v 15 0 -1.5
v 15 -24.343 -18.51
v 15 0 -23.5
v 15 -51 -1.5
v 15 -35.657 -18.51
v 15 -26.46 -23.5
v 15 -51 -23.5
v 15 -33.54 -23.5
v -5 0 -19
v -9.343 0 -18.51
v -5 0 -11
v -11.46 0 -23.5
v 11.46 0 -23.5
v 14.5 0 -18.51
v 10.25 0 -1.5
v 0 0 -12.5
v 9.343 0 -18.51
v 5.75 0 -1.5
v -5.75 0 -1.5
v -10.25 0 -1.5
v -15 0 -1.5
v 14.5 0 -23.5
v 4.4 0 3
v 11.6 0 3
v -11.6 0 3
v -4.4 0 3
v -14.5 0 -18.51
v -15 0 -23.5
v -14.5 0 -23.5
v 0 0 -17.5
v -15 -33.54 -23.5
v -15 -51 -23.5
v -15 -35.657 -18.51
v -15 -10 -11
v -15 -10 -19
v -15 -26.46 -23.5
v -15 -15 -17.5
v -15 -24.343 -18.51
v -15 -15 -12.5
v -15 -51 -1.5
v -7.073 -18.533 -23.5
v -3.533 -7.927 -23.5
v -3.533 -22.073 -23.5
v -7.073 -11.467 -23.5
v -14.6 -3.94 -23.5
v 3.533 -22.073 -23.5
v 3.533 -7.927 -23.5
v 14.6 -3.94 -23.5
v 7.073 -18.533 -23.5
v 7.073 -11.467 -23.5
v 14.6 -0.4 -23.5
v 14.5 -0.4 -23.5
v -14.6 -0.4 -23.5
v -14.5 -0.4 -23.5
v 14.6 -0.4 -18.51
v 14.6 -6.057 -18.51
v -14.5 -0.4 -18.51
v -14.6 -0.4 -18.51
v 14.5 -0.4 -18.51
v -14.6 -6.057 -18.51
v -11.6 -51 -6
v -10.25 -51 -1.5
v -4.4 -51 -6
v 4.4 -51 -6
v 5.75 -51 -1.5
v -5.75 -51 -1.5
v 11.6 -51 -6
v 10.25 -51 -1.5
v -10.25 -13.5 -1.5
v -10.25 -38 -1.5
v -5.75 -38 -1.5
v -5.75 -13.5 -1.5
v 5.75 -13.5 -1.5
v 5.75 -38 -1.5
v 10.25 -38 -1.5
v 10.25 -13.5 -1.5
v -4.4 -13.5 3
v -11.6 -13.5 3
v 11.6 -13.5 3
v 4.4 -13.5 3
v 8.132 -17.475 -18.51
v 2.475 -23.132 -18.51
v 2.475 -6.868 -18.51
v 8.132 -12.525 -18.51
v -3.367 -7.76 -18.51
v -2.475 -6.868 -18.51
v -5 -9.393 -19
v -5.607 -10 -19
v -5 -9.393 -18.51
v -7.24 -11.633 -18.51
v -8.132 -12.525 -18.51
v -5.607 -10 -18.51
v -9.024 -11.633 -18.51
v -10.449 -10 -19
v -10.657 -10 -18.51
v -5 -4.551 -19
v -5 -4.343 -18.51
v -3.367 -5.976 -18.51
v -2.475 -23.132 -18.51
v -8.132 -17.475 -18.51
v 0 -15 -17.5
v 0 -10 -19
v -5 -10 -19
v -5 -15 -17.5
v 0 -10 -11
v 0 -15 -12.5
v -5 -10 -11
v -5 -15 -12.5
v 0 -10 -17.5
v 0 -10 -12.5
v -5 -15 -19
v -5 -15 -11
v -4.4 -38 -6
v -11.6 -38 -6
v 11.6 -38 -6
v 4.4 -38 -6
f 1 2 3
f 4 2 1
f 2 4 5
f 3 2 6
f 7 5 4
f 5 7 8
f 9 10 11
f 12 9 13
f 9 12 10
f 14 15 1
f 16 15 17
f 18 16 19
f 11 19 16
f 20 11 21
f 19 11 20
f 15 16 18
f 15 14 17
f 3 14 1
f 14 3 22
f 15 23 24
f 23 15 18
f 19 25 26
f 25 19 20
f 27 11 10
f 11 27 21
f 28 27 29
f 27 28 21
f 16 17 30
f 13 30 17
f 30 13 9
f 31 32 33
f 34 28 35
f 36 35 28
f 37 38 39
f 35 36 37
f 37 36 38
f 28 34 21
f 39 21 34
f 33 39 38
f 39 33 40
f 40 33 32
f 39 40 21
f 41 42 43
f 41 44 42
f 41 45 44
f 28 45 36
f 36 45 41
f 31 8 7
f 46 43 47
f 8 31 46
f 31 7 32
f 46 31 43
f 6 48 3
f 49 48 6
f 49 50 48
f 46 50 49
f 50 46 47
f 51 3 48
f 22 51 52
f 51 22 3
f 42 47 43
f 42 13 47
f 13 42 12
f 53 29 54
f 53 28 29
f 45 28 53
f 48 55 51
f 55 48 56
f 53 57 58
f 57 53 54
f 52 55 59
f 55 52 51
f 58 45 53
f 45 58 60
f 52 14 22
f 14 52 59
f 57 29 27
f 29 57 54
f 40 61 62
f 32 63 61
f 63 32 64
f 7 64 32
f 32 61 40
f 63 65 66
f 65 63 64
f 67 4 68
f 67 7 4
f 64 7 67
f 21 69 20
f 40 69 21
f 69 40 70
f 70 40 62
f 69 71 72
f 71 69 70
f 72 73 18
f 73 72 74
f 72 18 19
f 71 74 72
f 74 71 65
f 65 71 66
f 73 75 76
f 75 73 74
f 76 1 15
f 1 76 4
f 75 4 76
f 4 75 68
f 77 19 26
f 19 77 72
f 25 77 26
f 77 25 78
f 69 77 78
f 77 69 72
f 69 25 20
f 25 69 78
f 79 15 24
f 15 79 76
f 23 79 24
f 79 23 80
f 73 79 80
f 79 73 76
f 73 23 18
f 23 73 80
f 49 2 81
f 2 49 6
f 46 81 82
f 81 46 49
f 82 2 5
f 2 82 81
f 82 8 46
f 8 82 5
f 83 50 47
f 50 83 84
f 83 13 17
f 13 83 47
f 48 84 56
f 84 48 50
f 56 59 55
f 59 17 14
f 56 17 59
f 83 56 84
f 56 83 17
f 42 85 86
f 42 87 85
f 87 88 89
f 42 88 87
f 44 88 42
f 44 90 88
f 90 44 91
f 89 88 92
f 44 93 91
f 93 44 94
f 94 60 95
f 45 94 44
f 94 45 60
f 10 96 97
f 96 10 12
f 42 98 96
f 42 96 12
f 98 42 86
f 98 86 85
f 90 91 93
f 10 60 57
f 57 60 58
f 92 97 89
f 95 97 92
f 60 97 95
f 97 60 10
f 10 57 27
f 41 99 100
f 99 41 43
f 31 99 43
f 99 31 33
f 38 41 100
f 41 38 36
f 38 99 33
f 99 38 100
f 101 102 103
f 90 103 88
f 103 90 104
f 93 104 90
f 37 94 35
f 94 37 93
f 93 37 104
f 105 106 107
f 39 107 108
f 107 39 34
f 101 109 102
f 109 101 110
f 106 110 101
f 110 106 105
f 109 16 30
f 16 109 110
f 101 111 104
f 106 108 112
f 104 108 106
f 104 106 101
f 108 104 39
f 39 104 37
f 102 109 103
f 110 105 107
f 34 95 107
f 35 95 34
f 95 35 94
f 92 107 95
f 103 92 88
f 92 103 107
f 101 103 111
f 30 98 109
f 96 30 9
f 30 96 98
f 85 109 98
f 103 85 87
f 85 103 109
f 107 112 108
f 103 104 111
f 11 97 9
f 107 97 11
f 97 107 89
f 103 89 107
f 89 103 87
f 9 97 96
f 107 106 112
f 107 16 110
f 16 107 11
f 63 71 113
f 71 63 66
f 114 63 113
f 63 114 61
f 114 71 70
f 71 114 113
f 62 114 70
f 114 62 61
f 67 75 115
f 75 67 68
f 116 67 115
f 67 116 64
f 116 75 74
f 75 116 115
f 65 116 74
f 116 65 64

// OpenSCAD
// file: include.scad
//////////////////      END SECTION       //////////////////

	module added_pins(){
		difference(){
			union(){
				translate([30/(15/4),obj_leg*leg_length,30/(15/4)]) pin();
				translate([30/(15/4)+14.5,obj_leg*leg_length,30/(15/4)+14]) pin();
			}
			union(){
							translate([30/(15/4)+13.5,obj_leg*leg_length-20,30/(15/4)+5])cube(size=[2,40,15]);
							translate([30/(15/4)+7.5,obj_leg*leg_length-20,30/(15/4)+15])rotate([0,90,0]) cube(size=[2,40,15]);	

							translate([30/(15/4)-1,obj_leg*leg_length-20,30/(15/4)-8])cube(size=[2,40,15]);
							translate([30/(15/4)-10,obj_leg*leg_length-20,30/(15/4)+1])rotate([0,90,0]) cube(size=[2,40,15]);
			}
		}
	}
	module taken_pins() {
		translate([30/(15/4)+14,obj_leg*leg_length-10,30/(15/4)]) mirror_pin();
		translate([30/(15/4),obj_leg*leg_length-10,30/(15/4)+15]) mirror_pin();
	}


//////////////////      OTHER STUFF       //////////////////

	module holes() {
		rotate([0,0,90]) for(y=[0:other_holes])
		translate([obj_leg+y*15,-15.5,7.5]) union() {
			translate([7.5,0,15]) hole_up();
			hole_down();
		}
	}
	module extend_holes() {
	module top(){
		rotate([0,0,90]) for(y=[0:other_holes+1])
		translate([(30/4)+y*15,-15.5,7.5]) union() {
			translate([7.5,0,15]) hole_up();
		}
	}
	module bottom(){
		rotate([0,0,90]) for(y=[0:other_holes+2])
		translate([(30/4)+y*15,-15.5,7.5]) union() {
			hole_down();
		
}
	}
	union(){
		top();
		bottom();
	}
	}

	module hole() {
		union() {
			rotate([90, 90, 0]) cylinder(h=40, d=hole_pin_diameter, center=true);
			translate([0,7.5,0]) sphere(d=hole_ball_size);
			translate([0,-6,0]) sphere(d=hole_ball_size);
		}
	}
	module hole_up() {
		union() {
			rotate([90, 90, 0]) cylinder(h=40, d=hole_pin_diameter, center=true);
			translate([0,7.5,10]) cylinder(h=hole_pin_height, d=hole_pin_diameter, center=true);
			translate([0,-6,10]) cylinder(h=hole_pin_height, d=hole_pin_diameter, center=true);
			translate([0,7.5,0]) sphere(d=hole_ball_size);
			translate([0,-6,0]) sphere(d=hole_ball_size);
		}
	}
	module hole_down() {
		union() {
			rotate([90, 90, 0]) cylinder(h=40, d=hole_pin_diameter, center=true);
			translate([0,7.5,-10]) cylinder(h=hole_pin_height, d=hole_pin_diameter, center=true);
			translate([0,-6,-10]) cylinder(h=hole_pin_height, d=hole_pin_diameter, center=true);
			translate([0,7.5,0]) sphere(d=hole_ball_size);
			translate([0,-6,0]) sphere(d=hole_ball_size);
		}
	}
	module pin() {
		union() {
			rotate([90, 90, 0]) cylinder(h=pin_height, d=pin_diameter, center=true);
			translate([0,7.5,0]) sphere(d=ball_size);
		}
	}

	module mirror_pin() {
		rotate([90, 90, 0]) cylinder(h=hole_pin_height+small_number, d=hole_pin_diameter, center=true);
		translate([0,-(pin_height-(ball_size/2)),0]) sphere(d=ball_size);
	}


//////////////////      SOME RACK AND Z THINGS       //////////////////

module z_holes() {
    rotate([0,-90,0]) for(z=[0:z_hole_number])
    translate([22.5+z*15,16,-12])
        hole();
}

module pin_cuts() {
	union(){
		cube(size=[2,10,40], center=true);
		rotate([0,0,90]) cube(size=[2,10,40], center=true);
	}
}
module pin_uncut() {
	union(){
		rotate([0, 0, 90]) cylinder(h=hole_pin_height, d=hole_pin_diameter, center=true);
		translate([0,0,10]) sphere(d=ball_hole);
	}
}


module pin_out() {
	union(){
		rotate([0, 0, 90]) cylinder(h=pin_height, d=pin_diameter, center=true);
		translate([0,0,10]) sphere(d= ball_size);
	}
}


module pins_z(){
	difference() {
		pin_out();
		pin_cuts();
	}
}
//////////////////      RACK AND SLIDE     ///////////////////

module straight_pins() {
	for(z=[0:((((obj_leg*leg_length)*2)-(obj_leg*2))/3)/14.5]) rotate([-90,0,0]) translate([z*15,30/(15/4),14]) pins_z();
	for(z=[0:((((obj_leg*leg_length)*2)-(obj_leg*2))/3)/14.5]) rotate([-90,0,0]) translate([z*15,30/(15/4)-14,14]) pins_z();
}
module stagger_pins() {
	for(z=[0:((((obj_leg*leg_length)*2)-(obj_leg*2))/3)/14.5]) rotate([-90,0,0]) translate([z*15,30/(15/4),14]) pins_z();
	for(z=[0:((((obj_leg*leg_length)*2)-(obj_leg*2))/3)/14.5]) rotate([-90,0,0]) translate([z*15+7,30/(15/4)-14,14]) pins_z();
}


//////////////////      DOVE TAIL       //////////////////

module male_dovetail(height) {
	dovetail_3d(max_width,min_width,depth,height);
}

module dovetail_3d(max_width=11, min_width=5, depth=5, height=30) {
	linear_extrude(height=height, convexity=2)
		dovetail_2d(max_width,min_width,depth);
}

module dovetail_2d(max_width=11, min_width=5, depth=5) {
	angle=atan((max_width/2-min_width/2)/depth);
	echo("angle: ", angle);
	polygon(paths=[[0,1,2,3,0]], points=[[-min_width/2,0], [-max_width/2,depth], [max_width/2, depth], [min_width/2,0]]);
}

//bow tie
	module tie_end(height){
				rotate([0,0,0]) translate([0,-0.01,((obj_leg/2)/2)]) male_dovetail(height);
				rotate([0,90,0]) translate([0,-0.01,((obj_leg/2)/2)]) male_dovetail(height);
				rotate([0,180,0]) translate([0,-0.01,((obj_leg/2)/2)]) male_dovetail(height);
				rotate([0,-90,0]) translate([0,-0.01,((obj_leg/2)/2)]) male_dovetail(height);
	}

module bow_support(){
	difference(){
		intersection(){
			translate([-15,0,-15]) cube([30,9,30]);
			scale([1.05,1.05,1.05]) rotate([0,45,0]) tie_end();
		}
		cube([29.2,29.2,29.2], center=true);
	}
}

	module wrap(){
		depth = 30;
				translate([-15,30,15]) rotate([90,180,90]) male_dovetail(height=depth);
				rotate([0,90,0]) translate([-15,30,15]) rotate([90,180,90]) male_dovetail(height=depth);
				rotate([0,180,0]) translate([-15,30,15]) rotate([90,180,90]) male_dovetail(height=depth);
				rotate([0,-90,0]) translate([-15,30,15]) rotate([90,180,90]) male_dovetail(height=depth);
	}
// file: globals.scad
/*
Most things in this file is represented as one millimeter, so keep that in mind while changing things.
Some of the setting are not mm but at variables that you can set, such as 2*x=2x and you are setting what x is.
I will try to specify when things are variables and not exact measurements.
*/

obj_leg = 30;
leg_length = 5.5;
small_number = 0.001;
metal_core_rode_global = 5;


///////////////// number of holes /////////////////////
z_hole_number = 8;
other_holes = 8;

///////////////// Pins /////////////////////

//pins that poke out
ball_size = 10;
pin_height = 20;
pin_diameter = 6;


//holes
hole_ball_size = ball_size;
hole_pin_height = pin_height;
hole_pin_diameter = pin_diameter;

///////////////// Z THINGS /////////////////////

berring_slot_width = 7.5;
berring_slot_depth = 6.5;
metal_core_rode = 5;

///////////////// X THINGS /////////////////////

//male dove tails
max_width=8;
min_width=5;
depth=5;
height=obj_leg/2;

//female dove tails, this is found on the y mounts
girl_max_width=11;
girl_min_width=5;
girl_depth=5;
girl_height=obj_leg;


///////////////// Y THINGS /////////////////////
/*
The Y is so normal that all of those global variables at the top should change all of the setting in it, this section is set her incase there are variables set in the future development of this project.
*/
// main file
include <globals.scad>;
include <include.scad>;

tail_depth = 55;
tail_depth_2 = -10;
thickness = 22;
module y_mount_added(){
	translate([0,-15+6-3.5,51/2]) cube([30,thickness,51], center=true);
    
    translate([-8,-12.5+thickness/2,-55+tail_depth]) scale([.9,.9,.9]) male_dovetail(height=15);
	translate([8,-12.5+thickness/2,-55+tail_depth]) scale([.9,.9,.9]) male_dovetail(height=15);
    

}

module y_mount_taken(){
	translate([0,-thickness/2-12.5,15]) rotate([0,45,0]) tie_end();
    
	rotate([180,0,0]) translate([-8,12.5-thickness/2,-55+tail_depth_2]) scale([.9,.9,.9]) male_dovetail(height=30);
	rotate([180,0,0]) translate([8,12.5-thickness/2,-55+tail_depth_2]) scale([.9,.9,.9]) male_dovetail(height=30);
translate([-15,-45,0]) wrap(3);
}
rotate([90,0,0]) difference(){
	translate([0,-thickness/2-12.5,15]) bow_support();
	translate([0,-thickness/2-12.5,25]) cube([50,10,20], center=true);
	translate([0,-thickness/2-12.5,0]) cube([29,10,20], center=true);
}

rotate([90,0,0]) difference(){
	y_mount_added();
	y_mount_taken();
}
